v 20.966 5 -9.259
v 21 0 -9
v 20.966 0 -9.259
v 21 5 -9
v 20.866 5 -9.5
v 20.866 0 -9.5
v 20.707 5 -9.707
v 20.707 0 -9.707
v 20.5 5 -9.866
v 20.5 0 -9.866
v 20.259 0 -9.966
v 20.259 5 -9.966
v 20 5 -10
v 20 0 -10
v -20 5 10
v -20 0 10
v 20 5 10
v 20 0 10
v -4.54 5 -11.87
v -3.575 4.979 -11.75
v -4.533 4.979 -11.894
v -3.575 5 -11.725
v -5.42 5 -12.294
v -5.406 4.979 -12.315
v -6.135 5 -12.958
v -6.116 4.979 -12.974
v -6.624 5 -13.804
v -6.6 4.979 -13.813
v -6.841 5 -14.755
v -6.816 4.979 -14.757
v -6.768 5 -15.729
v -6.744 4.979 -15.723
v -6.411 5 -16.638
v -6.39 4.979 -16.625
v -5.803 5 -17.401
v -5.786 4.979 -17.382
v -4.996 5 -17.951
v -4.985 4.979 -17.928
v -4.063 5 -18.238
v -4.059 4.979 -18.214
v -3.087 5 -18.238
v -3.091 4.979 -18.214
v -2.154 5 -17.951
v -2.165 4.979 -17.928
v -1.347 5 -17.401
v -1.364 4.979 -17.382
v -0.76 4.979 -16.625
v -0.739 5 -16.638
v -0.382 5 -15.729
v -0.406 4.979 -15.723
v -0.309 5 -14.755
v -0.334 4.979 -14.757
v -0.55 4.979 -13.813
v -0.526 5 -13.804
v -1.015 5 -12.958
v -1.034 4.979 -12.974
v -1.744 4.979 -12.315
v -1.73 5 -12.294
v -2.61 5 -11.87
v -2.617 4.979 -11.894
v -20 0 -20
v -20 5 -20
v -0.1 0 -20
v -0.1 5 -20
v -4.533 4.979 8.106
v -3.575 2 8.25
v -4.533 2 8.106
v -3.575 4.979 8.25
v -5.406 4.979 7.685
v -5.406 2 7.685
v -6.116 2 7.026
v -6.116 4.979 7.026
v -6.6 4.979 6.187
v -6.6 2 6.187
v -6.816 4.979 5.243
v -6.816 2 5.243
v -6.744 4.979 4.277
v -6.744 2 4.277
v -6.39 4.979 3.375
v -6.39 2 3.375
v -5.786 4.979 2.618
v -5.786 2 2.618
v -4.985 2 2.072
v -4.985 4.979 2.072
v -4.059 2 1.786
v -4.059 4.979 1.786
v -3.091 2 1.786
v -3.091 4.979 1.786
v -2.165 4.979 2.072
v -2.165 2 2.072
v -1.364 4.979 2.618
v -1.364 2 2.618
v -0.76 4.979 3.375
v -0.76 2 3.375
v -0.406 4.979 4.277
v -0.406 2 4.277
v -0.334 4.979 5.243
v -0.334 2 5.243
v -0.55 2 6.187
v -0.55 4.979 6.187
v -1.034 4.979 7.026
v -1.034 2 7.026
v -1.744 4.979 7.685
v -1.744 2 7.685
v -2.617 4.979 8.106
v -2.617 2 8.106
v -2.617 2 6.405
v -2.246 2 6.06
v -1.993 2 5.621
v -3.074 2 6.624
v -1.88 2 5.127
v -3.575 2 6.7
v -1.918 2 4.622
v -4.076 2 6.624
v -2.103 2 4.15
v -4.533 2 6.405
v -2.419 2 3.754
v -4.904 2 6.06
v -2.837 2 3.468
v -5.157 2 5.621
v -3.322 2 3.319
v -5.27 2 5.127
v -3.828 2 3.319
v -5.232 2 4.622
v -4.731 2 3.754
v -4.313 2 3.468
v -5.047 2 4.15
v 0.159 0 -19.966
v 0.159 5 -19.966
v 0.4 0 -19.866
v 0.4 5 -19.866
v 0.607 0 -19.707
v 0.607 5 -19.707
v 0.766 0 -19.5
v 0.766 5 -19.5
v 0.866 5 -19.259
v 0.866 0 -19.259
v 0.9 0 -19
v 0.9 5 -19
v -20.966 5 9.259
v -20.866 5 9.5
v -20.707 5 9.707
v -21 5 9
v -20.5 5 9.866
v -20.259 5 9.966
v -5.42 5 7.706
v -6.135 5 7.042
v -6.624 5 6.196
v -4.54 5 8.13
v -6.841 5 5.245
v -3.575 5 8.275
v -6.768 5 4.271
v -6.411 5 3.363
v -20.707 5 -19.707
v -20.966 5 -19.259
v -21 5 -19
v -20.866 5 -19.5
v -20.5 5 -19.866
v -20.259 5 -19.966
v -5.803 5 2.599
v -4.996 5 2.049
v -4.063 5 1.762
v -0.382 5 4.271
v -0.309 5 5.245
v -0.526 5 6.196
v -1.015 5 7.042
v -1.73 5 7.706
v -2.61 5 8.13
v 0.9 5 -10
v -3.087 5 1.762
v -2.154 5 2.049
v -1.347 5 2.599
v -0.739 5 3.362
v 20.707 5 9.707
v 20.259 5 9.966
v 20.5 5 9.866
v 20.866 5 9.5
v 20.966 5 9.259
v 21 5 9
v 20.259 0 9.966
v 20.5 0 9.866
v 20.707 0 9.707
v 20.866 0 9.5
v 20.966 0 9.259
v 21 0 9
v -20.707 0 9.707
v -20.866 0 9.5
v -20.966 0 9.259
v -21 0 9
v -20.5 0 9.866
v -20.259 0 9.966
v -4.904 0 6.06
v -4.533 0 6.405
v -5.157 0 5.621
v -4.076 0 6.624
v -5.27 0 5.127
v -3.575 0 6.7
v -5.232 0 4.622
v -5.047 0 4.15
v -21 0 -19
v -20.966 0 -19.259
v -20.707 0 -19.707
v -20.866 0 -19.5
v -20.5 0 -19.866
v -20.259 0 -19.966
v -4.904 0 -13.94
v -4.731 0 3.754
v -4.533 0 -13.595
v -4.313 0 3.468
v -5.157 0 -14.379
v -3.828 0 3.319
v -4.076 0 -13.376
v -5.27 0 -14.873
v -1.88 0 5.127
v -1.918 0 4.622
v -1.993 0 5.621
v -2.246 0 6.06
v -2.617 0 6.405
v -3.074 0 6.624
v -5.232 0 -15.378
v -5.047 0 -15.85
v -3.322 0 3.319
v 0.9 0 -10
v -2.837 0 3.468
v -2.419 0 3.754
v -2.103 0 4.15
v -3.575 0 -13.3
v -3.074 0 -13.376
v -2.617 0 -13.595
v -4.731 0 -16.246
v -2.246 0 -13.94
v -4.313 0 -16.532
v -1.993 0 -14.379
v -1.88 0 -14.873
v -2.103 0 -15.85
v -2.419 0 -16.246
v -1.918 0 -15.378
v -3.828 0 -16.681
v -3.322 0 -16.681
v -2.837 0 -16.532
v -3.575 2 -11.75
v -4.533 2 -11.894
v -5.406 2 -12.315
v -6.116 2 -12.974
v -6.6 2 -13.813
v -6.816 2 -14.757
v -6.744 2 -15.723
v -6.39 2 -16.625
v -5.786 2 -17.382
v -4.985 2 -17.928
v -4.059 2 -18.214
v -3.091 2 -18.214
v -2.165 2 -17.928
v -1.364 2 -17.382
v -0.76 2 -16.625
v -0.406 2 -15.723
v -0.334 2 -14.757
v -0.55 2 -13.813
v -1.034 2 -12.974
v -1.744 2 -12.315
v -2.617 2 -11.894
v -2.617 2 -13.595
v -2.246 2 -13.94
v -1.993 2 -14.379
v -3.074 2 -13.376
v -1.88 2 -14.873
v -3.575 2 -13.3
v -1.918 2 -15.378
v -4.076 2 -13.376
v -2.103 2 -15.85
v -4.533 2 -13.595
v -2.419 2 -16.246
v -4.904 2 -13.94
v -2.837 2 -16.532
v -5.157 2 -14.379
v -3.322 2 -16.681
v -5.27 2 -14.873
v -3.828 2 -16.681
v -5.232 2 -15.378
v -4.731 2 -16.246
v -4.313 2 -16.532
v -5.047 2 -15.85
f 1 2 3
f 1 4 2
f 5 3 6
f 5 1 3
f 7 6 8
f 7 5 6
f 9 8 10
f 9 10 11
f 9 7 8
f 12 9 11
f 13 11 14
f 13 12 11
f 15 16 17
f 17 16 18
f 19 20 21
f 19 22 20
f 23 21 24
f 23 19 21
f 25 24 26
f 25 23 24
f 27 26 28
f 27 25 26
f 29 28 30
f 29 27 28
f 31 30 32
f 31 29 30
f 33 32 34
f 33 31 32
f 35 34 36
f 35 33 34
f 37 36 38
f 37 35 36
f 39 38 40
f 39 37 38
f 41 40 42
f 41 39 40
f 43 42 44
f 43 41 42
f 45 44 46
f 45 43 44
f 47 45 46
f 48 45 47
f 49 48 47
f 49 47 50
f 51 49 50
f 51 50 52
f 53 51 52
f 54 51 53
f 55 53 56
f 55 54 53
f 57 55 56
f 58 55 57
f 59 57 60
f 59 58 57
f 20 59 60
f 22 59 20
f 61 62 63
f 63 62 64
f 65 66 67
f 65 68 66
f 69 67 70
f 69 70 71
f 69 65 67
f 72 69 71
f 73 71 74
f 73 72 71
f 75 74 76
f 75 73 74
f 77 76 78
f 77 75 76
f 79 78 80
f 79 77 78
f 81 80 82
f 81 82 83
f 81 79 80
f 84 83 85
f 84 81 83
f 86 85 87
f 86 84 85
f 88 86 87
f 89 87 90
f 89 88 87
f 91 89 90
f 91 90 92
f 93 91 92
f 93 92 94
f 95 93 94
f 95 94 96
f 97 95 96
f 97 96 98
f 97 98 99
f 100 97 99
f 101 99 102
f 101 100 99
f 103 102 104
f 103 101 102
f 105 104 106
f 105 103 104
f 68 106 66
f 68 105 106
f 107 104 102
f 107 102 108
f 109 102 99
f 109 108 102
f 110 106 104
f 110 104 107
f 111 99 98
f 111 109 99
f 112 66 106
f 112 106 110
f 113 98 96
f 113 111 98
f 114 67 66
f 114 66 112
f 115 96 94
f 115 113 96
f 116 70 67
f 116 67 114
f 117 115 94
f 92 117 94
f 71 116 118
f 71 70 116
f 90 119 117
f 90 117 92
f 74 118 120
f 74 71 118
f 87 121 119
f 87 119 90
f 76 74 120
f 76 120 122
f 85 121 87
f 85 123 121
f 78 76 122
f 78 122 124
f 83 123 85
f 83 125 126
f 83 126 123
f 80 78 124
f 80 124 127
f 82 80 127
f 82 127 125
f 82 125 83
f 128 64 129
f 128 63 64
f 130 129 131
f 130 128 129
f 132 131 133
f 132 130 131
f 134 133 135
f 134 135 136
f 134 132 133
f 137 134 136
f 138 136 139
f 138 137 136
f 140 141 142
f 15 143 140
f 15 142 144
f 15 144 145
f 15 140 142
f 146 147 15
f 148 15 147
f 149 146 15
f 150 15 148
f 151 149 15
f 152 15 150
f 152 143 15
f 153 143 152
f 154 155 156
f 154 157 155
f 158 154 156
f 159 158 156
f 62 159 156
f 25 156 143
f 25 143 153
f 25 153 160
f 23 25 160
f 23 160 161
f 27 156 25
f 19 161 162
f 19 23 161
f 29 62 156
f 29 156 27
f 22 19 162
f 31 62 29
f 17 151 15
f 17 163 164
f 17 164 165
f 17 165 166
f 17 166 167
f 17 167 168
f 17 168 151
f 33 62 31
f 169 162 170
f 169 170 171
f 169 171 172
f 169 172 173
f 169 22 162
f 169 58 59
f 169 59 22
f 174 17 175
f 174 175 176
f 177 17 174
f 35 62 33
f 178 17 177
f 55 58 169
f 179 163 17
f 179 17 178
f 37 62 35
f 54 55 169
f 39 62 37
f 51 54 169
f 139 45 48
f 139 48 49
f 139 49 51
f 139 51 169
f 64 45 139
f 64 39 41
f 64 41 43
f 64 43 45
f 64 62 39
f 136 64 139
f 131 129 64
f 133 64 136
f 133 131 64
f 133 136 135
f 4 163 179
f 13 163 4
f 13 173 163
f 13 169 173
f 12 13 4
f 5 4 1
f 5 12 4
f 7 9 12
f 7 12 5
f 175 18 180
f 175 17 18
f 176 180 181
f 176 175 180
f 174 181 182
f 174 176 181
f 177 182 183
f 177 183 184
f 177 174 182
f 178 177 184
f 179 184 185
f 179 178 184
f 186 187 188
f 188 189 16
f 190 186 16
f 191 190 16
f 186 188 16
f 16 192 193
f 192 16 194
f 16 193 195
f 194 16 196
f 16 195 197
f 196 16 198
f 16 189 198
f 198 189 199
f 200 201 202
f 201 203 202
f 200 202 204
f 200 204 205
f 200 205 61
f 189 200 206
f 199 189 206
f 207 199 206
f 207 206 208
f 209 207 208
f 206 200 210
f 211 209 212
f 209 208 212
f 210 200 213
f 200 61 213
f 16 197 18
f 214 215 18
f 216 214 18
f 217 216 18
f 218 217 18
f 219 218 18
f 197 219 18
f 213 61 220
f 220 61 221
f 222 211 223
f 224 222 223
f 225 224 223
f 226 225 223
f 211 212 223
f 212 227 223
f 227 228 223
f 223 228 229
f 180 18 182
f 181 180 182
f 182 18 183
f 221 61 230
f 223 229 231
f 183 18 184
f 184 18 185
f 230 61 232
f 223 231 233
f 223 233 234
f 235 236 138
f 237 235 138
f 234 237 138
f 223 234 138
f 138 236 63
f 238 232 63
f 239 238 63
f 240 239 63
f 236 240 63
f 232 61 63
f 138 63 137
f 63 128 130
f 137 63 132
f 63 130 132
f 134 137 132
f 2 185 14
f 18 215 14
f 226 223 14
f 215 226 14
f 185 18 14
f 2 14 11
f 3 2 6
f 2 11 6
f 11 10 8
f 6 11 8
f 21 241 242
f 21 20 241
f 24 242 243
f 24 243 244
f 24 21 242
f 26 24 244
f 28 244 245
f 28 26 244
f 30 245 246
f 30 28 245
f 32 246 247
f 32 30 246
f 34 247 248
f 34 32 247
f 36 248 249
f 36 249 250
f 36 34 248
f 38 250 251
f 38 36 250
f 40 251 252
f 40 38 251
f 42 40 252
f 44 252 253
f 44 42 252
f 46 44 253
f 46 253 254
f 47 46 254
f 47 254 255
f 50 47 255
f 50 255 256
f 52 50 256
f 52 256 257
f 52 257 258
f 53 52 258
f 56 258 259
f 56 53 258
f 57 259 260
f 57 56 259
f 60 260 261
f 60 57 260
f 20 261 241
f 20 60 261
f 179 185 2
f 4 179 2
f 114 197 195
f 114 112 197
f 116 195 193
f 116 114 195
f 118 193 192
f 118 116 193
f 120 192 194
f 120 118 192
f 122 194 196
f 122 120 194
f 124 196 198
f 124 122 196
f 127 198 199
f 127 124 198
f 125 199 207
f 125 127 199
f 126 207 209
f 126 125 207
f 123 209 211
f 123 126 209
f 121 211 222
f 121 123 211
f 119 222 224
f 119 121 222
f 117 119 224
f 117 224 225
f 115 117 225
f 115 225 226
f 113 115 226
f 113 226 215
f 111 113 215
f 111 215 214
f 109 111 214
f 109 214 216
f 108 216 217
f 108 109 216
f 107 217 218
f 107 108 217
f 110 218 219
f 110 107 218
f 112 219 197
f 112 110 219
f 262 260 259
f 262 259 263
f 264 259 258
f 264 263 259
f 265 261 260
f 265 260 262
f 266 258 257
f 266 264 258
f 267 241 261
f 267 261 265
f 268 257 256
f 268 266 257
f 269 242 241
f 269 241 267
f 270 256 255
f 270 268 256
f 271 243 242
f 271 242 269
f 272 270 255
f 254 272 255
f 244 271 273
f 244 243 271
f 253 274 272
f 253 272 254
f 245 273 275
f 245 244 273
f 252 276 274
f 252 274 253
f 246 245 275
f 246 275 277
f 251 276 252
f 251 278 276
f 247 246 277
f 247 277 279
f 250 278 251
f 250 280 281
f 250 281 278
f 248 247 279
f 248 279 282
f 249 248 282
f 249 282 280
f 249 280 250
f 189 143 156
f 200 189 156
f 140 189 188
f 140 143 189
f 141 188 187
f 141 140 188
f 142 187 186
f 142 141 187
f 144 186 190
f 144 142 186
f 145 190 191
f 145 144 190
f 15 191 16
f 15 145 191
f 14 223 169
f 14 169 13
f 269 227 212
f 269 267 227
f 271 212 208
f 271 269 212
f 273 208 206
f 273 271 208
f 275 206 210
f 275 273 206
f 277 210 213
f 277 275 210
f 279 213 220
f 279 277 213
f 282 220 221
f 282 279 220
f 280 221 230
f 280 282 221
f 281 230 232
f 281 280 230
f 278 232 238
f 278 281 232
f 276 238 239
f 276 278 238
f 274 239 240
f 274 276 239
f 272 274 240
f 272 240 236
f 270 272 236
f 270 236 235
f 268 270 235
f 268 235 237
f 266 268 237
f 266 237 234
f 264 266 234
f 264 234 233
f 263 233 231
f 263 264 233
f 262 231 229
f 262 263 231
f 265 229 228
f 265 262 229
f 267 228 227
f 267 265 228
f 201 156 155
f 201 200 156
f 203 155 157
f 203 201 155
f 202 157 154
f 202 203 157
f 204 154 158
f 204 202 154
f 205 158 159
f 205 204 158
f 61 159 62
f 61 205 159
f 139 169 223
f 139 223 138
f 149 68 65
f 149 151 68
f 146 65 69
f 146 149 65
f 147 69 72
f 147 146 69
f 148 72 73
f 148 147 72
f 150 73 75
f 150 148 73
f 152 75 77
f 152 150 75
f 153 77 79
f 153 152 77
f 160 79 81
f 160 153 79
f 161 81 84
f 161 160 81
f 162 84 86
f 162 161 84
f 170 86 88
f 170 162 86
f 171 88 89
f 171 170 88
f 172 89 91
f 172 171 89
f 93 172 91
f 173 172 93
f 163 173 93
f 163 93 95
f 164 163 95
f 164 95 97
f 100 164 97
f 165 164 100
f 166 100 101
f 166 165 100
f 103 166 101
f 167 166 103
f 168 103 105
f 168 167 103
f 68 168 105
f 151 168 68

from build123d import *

# Parameters (mm, degrees)
SKETCH1_W                     = 42
SKETCH1_H                     = 20
BOSS_EXTRUDE1_DEPTH           = 5
SKETCH2_W                     = 21.9
SKETCH2_H                     = 10
BOSS_EXTRUDE2_DEPTH           = 5
CBORE_FOR_M3_SHCS1_AT_2_COUNT = 2
CBORE_FOR_M3_SHCS1_AT_2_PITCH = 20
FILLET1_R                     = 1


with BuildPart() as part:
    # Sketch1 → Boss-Extrude1 (new body)
    with BuildSketch(Plane(origin=(0, 0, 0), x_dir=(1, 0, 0), z_dir=(0, 1, 0))):
        Rectangle(SKETCH1_W, SKETCH1_H)
    extrude(amount=BOSS_EXTRUDE1_DEPTH)

    # Sketch2 → Boss-Extrude2 (add)
    with BuildSketch(Plane(origin=(0, 5, 0), x_dir=(1, 0, 0), z_dir=(0, 1, 0))):
        with Locations((-10.05, 15)):
            Rectangle(SKETCH2_W, SKETCH2_H)
    extrude(amount=-BOSS_EXTRUDE2_DEPTH)

    # Sketch7 → CBORE for M3 SHCS1 (revolve, cut)
    with BuildSketch(Plane(origin=(-3.575, 5, -15), x_dir=(0, 0, 1), z_dir=(1, 0, 0))):
        Polygon((0, 0), (0, 5), (1.7, 5), (1.7, 3), (3.25, 3), (3.25, 0.020977491), (3.275, 0), align=None)
    cbore_for_m3_shcs1 = revolve(axis=Axis((-3.575, 11.35, -15), (0, -1, 0)), mode=Mode.SUBTRACT)

    # CBORE for M3 SHCS1 at 2: CBORE for M3 SHCS1 ×2
    with Locations(*[(0, 0, i * CBORE_FOR_M3_SHCS1_AT_2_PITCH) for i in range(1, CBORE_FOR_M3_SHCS1_AT_2_COUNT)]):
        add(cbore_for_m3_shcs1, mode=Mode.SUBTRACT)

    # Fillet1
    fillet1_edges = [part.edges().sort_by_distance(p)[0] for p in [
        (-21, 2.5, -20),
        (0.9, 2.5, -20),
        (21, 2.5, -10),
        (21, 2.5, 10),
        (-21, 2.5, 10),
    ]]
    fillet(fillet1_edges, radius=FILLET1_R)


solid = part.part
